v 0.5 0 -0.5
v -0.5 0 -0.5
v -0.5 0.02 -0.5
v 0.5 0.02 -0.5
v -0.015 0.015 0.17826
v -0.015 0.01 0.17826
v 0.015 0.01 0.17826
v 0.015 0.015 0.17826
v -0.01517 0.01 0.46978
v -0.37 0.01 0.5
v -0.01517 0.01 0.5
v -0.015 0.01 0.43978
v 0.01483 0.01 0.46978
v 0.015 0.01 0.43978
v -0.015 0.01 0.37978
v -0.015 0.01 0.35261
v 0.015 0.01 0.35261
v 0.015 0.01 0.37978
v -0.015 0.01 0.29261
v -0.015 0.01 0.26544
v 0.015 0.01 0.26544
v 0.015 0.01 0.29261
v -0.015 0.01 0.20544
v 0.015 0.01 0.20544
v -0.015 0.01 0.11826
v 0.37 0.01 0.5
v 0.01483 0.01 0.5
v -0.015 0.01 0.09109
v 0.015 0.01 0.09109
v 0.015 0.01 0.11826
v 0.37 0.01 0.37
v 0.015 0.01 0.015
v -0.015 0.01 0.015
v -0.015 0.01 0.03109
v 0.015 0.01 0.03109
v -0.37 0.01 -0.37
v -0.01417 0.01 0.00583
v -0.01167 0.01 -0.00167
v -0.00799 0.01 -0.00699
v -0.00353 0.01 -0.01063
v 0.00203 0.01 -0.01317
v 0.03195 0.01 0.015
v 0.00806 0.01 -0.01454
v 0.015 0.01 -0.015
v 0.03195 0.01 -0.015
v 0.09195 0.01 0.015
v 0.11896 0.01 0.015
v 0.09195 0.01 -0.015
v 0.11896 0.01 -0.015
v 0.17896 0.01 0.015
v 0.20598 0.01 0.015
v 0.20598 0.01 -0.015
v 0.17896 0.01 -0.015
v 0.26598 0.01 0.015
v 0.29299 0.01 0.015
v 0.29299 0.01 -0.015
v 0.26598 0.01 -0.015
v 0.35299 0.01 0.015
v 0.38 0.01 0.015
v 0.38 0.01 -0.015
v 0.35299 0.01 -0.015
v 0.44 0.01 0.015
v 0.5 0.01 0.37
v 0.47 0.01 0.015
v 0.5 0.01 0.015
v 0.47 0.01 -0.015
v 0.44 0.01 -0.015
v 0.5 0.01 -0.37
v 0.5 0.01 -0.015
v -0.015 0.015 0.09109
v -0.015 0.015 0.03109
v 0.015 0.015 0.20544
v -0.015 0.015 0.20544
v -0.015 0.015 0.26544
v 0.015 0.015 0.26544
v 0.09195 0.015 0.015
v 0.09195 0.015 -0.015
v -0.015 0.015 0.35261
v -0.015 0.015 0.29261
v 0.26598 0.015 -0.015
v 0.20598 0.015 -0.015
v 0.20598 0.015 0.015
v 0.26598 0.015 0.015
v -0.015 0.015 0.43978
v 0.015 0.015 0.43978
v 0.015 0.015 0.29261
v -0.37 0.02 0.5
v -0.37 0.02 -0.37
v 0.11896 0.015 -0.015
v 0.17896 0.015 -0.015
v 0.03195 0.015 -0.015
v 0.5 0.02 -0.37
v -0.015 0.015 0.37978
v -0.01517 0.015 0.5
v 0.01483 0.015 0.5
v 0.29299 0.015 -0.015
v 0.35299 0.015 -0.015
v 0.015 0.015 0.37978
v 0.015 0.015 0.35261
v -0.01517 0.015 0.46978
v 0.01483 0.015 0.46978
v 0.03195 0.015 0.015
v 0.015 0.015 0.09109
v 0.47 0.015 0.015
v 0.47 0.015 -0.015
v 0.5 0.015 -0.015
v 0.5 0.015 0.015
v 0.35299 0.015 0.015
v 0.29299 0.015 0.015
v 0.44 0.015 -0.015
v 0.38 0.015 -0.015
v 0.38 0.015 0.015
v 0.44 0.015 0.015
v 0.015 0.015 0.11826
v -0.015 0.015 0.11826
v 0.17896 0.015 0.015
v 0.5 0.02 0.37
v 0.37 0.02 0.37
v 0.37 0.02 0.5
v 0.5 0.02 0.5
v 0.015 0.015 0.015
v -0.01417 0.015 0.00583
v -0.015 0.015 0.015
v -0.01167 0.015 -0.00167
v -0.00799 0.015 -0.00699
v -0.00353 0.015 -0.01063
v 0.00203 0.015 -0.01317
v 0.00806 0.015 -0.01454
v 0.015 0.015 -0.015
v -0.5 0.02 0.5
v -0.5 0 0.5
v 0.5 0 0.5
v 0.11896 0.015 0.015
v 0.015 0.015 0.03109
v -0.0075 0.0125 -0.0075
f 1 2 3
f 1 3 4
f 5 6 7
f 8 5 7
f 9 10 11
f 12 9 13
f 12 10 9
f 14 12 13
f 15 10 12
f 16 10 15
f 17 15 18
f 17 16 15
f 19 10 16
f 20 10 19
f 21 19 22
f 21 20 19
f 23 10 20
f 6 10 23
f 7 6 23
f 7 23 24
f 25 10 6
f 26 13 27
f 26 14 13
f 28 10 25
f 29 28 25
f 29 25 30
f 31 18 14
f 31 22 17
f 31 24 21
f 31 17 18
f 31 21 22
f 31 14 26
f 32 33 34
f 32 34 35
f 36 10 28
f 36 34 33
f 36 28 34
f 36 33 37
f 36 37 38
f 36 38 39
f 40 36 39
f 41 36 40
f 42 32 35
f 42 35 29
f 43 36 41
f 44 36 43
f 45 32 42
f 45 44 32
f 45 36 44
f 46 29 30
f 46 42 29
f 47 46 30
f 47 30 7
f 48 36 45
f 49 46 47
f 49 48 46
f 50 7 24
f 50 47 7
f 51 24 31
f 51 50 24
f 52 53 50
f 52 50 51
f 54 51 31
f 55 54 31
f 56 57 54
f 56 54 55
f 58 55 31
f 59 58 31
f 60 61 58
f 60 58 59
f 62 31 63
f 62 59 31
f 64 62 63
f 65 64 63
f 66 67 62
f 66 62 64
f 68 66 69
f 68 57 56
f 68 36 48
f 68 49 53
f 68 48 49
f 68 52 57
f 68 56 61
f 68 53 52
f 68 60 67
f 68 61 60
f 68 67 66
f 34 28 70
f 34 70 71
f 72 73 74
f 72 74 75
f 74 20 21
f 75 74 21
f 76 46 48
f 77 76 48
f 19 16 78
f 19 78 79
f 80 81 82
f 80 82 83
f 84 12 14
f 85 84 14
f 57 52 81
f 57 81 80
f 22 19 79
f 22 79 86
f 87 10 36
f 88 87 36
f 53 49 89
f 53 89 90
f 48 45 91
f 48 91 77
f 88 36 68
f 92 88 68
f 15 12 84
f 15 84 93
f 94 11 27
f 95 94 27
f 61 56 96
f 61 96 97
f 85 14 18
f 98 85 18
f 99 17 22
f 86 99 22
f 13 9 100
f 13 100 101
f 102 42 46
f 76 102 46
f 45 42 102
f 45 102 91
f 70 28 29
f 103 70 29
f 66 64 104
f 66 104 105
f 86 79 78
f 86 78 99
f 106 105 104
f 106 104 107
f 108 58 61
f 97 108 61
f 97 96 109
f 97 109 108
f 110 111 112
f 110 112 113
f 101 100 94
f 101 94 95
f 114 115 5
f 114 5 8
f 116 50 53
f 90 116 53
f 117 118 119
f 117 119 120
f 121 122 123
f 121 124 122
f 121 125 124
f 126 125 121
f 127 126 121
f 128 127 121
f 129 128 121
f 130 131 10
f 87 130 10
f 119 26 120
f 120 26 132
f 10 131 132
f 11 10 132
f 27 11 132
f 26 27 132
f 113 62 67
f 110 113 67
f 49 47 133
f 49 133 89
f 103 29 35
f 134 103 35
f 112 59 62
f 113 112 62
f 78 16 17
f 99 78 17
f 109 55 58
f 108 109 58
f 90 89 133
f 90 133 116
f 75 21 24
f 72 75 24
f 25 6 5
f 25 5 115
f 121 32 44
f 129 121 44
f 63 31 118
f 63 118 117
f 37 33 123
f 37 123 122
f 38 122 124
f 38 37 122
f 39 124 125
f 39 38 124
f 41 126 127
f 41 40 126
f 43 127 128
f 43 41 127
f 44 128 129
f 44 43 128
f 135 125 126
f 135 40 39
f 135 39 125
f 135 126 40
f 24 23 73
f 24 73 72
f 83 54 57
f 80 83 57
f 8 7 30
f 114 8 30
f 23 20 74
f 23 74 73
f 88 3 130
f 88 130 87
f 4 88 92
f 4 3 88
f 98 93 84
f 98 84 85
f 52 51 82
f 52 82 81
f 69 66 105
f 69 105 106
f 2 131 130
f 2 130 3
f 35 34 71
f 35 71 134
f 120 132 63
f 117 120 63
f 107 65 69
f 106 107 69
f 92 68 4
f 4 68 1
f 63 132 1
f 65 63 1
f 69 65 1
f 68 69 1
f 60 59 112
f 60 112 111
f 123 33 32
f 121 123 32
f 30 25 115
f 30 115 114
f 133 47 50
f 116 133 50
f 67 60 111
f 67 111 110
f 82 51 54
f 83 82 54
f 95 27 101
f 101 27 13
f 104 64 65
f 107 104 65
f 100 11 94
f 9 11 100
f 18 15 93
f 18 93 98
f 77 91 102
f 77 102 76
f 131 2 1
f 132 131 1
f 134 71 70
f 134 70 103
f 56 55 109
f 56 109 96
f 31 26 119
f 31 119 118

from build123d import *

# Parameters (mm, degrees)
ESBO_O1_W                = 1
ESBO_O1_H                = 1
RESSALTO_EXTRUS_O1_DEPTH = 0.01
ESBO_O2_W                = 0.13
ESBO_O2_H                = 0.13
RESSALTO_EXTRUS_O2_DEPTH = 0.02
ESBO_O3_W                = 0.03
ESBO_O3_H                = 0.030215991
ESBO_O3_H_2              = 0.06
ESBO_O3_H_3              = 0.03
ESBO_O3_W_2              = 0.06
RESSALTO_EXTRUS_O4_DEPTH = 0.005


with BuildPart() as part:
    # Esboço1 → Ressalto-extrusão1 (new body)
    with BuildSketch(Plane(origin=(0, 0, 0), x_dir=(1, 0, 0), z_dir=(0, 1, 0))):
        Rectangle(ESBO_O1_W, ESBO_O1_H)
    extrude(amount=RESSALTO_EXTRUS_O1_DEPTH)

    # Esboço2 → Ressalto-extrusão2 (add)
    with BuildSketch(Plane(origin=(0, 0, 0), x_dir=(1, 0, 0), z_dir=(0, 1, 0))):
        Polygon((0.5, 0.5), (-0.5, 0.5), (-0.5, -0.5), (-0.37, -0.5), (-0.37, 0.37), (0.5, 0.37), align=None)
        with Locations((0.435, -0.435)):
            Rectangle(ESBO_O2_W, ESBO_O2_H)
    extrude(amount=RESSALTO_EXTRUS_O2_DEPTH)

    # Esboço3 → Ressalto-extrusão4 (add)
    with BuildSketch(Plane(origin=(0, 0.01, 0), x_dir=(1, 0, 0), z_dir=(0, 1, 0))):
        with Locations((-0.000170216, -0.484892793)):
            Rectangle(ESBO_O3_W, ESBO_O3_H)
        with Locations((0, -0.409784797)):
            Rectangle(ESBO_O3_W, ESBO_O3_H_2)
        with BuildLine():
            Line((-0.015, -0.015), (0.015, -0.015))
            Line((0.015, -0.015), (0.015, 0.015))
            add(Edge.make_bspline(
                [(-0.015, -0.015), (-0.015, 0.015), (0.015, 0.015)],
                knots=[0, 0, 0, 1, 1, 1], degree=2))
        make_face()
        with Locations((0.485, 0)):
            Rectangle(ESBO_O3_W, ESBO_O3_H_3)
        with Locations((0.32298751, 0)):
            Rectangle(ESBO_O3_W_2, ESBO_O3_H_3)
        with Locations((0.41, 0)):
            Rectangle(ESBO_O3_W_2, ESBO_O3_H_3)
        with Locations((0.235975021, 0)):
            Rectangle(ESBO_O3_W_2, ESBO_O3_H_3)
        with Locations((0.148962531, 0)):
            Rectangle(ESBO_O3_W_2, ESBO_O3_H_3)
        with Locations((0.061950042, 0)):
            Rectangle(ESBO_O3_W_2, ESBO_O3_H_3)
        with Locations((0, -0.322610574)):
            Rectangle(ESBO_O3_W, ESBO_O3_H_2)
        with Locations((0, -0.235436351)):
            Rectangle(ESBO_O3_W, ESBO_O3_H_2)
        with Locations((0, -0.148262129)):
            Rectangle(ESBO_O3_W, ESBO_O3_H_2)
        with Locations((0, -0.061087906)):
            Rectangle(ESBO_O3_W, ESBO_O3_H_2)
    extrude(amount=RESSALTO_EXTRUS_O4_DEPTH)


solid = part.part
